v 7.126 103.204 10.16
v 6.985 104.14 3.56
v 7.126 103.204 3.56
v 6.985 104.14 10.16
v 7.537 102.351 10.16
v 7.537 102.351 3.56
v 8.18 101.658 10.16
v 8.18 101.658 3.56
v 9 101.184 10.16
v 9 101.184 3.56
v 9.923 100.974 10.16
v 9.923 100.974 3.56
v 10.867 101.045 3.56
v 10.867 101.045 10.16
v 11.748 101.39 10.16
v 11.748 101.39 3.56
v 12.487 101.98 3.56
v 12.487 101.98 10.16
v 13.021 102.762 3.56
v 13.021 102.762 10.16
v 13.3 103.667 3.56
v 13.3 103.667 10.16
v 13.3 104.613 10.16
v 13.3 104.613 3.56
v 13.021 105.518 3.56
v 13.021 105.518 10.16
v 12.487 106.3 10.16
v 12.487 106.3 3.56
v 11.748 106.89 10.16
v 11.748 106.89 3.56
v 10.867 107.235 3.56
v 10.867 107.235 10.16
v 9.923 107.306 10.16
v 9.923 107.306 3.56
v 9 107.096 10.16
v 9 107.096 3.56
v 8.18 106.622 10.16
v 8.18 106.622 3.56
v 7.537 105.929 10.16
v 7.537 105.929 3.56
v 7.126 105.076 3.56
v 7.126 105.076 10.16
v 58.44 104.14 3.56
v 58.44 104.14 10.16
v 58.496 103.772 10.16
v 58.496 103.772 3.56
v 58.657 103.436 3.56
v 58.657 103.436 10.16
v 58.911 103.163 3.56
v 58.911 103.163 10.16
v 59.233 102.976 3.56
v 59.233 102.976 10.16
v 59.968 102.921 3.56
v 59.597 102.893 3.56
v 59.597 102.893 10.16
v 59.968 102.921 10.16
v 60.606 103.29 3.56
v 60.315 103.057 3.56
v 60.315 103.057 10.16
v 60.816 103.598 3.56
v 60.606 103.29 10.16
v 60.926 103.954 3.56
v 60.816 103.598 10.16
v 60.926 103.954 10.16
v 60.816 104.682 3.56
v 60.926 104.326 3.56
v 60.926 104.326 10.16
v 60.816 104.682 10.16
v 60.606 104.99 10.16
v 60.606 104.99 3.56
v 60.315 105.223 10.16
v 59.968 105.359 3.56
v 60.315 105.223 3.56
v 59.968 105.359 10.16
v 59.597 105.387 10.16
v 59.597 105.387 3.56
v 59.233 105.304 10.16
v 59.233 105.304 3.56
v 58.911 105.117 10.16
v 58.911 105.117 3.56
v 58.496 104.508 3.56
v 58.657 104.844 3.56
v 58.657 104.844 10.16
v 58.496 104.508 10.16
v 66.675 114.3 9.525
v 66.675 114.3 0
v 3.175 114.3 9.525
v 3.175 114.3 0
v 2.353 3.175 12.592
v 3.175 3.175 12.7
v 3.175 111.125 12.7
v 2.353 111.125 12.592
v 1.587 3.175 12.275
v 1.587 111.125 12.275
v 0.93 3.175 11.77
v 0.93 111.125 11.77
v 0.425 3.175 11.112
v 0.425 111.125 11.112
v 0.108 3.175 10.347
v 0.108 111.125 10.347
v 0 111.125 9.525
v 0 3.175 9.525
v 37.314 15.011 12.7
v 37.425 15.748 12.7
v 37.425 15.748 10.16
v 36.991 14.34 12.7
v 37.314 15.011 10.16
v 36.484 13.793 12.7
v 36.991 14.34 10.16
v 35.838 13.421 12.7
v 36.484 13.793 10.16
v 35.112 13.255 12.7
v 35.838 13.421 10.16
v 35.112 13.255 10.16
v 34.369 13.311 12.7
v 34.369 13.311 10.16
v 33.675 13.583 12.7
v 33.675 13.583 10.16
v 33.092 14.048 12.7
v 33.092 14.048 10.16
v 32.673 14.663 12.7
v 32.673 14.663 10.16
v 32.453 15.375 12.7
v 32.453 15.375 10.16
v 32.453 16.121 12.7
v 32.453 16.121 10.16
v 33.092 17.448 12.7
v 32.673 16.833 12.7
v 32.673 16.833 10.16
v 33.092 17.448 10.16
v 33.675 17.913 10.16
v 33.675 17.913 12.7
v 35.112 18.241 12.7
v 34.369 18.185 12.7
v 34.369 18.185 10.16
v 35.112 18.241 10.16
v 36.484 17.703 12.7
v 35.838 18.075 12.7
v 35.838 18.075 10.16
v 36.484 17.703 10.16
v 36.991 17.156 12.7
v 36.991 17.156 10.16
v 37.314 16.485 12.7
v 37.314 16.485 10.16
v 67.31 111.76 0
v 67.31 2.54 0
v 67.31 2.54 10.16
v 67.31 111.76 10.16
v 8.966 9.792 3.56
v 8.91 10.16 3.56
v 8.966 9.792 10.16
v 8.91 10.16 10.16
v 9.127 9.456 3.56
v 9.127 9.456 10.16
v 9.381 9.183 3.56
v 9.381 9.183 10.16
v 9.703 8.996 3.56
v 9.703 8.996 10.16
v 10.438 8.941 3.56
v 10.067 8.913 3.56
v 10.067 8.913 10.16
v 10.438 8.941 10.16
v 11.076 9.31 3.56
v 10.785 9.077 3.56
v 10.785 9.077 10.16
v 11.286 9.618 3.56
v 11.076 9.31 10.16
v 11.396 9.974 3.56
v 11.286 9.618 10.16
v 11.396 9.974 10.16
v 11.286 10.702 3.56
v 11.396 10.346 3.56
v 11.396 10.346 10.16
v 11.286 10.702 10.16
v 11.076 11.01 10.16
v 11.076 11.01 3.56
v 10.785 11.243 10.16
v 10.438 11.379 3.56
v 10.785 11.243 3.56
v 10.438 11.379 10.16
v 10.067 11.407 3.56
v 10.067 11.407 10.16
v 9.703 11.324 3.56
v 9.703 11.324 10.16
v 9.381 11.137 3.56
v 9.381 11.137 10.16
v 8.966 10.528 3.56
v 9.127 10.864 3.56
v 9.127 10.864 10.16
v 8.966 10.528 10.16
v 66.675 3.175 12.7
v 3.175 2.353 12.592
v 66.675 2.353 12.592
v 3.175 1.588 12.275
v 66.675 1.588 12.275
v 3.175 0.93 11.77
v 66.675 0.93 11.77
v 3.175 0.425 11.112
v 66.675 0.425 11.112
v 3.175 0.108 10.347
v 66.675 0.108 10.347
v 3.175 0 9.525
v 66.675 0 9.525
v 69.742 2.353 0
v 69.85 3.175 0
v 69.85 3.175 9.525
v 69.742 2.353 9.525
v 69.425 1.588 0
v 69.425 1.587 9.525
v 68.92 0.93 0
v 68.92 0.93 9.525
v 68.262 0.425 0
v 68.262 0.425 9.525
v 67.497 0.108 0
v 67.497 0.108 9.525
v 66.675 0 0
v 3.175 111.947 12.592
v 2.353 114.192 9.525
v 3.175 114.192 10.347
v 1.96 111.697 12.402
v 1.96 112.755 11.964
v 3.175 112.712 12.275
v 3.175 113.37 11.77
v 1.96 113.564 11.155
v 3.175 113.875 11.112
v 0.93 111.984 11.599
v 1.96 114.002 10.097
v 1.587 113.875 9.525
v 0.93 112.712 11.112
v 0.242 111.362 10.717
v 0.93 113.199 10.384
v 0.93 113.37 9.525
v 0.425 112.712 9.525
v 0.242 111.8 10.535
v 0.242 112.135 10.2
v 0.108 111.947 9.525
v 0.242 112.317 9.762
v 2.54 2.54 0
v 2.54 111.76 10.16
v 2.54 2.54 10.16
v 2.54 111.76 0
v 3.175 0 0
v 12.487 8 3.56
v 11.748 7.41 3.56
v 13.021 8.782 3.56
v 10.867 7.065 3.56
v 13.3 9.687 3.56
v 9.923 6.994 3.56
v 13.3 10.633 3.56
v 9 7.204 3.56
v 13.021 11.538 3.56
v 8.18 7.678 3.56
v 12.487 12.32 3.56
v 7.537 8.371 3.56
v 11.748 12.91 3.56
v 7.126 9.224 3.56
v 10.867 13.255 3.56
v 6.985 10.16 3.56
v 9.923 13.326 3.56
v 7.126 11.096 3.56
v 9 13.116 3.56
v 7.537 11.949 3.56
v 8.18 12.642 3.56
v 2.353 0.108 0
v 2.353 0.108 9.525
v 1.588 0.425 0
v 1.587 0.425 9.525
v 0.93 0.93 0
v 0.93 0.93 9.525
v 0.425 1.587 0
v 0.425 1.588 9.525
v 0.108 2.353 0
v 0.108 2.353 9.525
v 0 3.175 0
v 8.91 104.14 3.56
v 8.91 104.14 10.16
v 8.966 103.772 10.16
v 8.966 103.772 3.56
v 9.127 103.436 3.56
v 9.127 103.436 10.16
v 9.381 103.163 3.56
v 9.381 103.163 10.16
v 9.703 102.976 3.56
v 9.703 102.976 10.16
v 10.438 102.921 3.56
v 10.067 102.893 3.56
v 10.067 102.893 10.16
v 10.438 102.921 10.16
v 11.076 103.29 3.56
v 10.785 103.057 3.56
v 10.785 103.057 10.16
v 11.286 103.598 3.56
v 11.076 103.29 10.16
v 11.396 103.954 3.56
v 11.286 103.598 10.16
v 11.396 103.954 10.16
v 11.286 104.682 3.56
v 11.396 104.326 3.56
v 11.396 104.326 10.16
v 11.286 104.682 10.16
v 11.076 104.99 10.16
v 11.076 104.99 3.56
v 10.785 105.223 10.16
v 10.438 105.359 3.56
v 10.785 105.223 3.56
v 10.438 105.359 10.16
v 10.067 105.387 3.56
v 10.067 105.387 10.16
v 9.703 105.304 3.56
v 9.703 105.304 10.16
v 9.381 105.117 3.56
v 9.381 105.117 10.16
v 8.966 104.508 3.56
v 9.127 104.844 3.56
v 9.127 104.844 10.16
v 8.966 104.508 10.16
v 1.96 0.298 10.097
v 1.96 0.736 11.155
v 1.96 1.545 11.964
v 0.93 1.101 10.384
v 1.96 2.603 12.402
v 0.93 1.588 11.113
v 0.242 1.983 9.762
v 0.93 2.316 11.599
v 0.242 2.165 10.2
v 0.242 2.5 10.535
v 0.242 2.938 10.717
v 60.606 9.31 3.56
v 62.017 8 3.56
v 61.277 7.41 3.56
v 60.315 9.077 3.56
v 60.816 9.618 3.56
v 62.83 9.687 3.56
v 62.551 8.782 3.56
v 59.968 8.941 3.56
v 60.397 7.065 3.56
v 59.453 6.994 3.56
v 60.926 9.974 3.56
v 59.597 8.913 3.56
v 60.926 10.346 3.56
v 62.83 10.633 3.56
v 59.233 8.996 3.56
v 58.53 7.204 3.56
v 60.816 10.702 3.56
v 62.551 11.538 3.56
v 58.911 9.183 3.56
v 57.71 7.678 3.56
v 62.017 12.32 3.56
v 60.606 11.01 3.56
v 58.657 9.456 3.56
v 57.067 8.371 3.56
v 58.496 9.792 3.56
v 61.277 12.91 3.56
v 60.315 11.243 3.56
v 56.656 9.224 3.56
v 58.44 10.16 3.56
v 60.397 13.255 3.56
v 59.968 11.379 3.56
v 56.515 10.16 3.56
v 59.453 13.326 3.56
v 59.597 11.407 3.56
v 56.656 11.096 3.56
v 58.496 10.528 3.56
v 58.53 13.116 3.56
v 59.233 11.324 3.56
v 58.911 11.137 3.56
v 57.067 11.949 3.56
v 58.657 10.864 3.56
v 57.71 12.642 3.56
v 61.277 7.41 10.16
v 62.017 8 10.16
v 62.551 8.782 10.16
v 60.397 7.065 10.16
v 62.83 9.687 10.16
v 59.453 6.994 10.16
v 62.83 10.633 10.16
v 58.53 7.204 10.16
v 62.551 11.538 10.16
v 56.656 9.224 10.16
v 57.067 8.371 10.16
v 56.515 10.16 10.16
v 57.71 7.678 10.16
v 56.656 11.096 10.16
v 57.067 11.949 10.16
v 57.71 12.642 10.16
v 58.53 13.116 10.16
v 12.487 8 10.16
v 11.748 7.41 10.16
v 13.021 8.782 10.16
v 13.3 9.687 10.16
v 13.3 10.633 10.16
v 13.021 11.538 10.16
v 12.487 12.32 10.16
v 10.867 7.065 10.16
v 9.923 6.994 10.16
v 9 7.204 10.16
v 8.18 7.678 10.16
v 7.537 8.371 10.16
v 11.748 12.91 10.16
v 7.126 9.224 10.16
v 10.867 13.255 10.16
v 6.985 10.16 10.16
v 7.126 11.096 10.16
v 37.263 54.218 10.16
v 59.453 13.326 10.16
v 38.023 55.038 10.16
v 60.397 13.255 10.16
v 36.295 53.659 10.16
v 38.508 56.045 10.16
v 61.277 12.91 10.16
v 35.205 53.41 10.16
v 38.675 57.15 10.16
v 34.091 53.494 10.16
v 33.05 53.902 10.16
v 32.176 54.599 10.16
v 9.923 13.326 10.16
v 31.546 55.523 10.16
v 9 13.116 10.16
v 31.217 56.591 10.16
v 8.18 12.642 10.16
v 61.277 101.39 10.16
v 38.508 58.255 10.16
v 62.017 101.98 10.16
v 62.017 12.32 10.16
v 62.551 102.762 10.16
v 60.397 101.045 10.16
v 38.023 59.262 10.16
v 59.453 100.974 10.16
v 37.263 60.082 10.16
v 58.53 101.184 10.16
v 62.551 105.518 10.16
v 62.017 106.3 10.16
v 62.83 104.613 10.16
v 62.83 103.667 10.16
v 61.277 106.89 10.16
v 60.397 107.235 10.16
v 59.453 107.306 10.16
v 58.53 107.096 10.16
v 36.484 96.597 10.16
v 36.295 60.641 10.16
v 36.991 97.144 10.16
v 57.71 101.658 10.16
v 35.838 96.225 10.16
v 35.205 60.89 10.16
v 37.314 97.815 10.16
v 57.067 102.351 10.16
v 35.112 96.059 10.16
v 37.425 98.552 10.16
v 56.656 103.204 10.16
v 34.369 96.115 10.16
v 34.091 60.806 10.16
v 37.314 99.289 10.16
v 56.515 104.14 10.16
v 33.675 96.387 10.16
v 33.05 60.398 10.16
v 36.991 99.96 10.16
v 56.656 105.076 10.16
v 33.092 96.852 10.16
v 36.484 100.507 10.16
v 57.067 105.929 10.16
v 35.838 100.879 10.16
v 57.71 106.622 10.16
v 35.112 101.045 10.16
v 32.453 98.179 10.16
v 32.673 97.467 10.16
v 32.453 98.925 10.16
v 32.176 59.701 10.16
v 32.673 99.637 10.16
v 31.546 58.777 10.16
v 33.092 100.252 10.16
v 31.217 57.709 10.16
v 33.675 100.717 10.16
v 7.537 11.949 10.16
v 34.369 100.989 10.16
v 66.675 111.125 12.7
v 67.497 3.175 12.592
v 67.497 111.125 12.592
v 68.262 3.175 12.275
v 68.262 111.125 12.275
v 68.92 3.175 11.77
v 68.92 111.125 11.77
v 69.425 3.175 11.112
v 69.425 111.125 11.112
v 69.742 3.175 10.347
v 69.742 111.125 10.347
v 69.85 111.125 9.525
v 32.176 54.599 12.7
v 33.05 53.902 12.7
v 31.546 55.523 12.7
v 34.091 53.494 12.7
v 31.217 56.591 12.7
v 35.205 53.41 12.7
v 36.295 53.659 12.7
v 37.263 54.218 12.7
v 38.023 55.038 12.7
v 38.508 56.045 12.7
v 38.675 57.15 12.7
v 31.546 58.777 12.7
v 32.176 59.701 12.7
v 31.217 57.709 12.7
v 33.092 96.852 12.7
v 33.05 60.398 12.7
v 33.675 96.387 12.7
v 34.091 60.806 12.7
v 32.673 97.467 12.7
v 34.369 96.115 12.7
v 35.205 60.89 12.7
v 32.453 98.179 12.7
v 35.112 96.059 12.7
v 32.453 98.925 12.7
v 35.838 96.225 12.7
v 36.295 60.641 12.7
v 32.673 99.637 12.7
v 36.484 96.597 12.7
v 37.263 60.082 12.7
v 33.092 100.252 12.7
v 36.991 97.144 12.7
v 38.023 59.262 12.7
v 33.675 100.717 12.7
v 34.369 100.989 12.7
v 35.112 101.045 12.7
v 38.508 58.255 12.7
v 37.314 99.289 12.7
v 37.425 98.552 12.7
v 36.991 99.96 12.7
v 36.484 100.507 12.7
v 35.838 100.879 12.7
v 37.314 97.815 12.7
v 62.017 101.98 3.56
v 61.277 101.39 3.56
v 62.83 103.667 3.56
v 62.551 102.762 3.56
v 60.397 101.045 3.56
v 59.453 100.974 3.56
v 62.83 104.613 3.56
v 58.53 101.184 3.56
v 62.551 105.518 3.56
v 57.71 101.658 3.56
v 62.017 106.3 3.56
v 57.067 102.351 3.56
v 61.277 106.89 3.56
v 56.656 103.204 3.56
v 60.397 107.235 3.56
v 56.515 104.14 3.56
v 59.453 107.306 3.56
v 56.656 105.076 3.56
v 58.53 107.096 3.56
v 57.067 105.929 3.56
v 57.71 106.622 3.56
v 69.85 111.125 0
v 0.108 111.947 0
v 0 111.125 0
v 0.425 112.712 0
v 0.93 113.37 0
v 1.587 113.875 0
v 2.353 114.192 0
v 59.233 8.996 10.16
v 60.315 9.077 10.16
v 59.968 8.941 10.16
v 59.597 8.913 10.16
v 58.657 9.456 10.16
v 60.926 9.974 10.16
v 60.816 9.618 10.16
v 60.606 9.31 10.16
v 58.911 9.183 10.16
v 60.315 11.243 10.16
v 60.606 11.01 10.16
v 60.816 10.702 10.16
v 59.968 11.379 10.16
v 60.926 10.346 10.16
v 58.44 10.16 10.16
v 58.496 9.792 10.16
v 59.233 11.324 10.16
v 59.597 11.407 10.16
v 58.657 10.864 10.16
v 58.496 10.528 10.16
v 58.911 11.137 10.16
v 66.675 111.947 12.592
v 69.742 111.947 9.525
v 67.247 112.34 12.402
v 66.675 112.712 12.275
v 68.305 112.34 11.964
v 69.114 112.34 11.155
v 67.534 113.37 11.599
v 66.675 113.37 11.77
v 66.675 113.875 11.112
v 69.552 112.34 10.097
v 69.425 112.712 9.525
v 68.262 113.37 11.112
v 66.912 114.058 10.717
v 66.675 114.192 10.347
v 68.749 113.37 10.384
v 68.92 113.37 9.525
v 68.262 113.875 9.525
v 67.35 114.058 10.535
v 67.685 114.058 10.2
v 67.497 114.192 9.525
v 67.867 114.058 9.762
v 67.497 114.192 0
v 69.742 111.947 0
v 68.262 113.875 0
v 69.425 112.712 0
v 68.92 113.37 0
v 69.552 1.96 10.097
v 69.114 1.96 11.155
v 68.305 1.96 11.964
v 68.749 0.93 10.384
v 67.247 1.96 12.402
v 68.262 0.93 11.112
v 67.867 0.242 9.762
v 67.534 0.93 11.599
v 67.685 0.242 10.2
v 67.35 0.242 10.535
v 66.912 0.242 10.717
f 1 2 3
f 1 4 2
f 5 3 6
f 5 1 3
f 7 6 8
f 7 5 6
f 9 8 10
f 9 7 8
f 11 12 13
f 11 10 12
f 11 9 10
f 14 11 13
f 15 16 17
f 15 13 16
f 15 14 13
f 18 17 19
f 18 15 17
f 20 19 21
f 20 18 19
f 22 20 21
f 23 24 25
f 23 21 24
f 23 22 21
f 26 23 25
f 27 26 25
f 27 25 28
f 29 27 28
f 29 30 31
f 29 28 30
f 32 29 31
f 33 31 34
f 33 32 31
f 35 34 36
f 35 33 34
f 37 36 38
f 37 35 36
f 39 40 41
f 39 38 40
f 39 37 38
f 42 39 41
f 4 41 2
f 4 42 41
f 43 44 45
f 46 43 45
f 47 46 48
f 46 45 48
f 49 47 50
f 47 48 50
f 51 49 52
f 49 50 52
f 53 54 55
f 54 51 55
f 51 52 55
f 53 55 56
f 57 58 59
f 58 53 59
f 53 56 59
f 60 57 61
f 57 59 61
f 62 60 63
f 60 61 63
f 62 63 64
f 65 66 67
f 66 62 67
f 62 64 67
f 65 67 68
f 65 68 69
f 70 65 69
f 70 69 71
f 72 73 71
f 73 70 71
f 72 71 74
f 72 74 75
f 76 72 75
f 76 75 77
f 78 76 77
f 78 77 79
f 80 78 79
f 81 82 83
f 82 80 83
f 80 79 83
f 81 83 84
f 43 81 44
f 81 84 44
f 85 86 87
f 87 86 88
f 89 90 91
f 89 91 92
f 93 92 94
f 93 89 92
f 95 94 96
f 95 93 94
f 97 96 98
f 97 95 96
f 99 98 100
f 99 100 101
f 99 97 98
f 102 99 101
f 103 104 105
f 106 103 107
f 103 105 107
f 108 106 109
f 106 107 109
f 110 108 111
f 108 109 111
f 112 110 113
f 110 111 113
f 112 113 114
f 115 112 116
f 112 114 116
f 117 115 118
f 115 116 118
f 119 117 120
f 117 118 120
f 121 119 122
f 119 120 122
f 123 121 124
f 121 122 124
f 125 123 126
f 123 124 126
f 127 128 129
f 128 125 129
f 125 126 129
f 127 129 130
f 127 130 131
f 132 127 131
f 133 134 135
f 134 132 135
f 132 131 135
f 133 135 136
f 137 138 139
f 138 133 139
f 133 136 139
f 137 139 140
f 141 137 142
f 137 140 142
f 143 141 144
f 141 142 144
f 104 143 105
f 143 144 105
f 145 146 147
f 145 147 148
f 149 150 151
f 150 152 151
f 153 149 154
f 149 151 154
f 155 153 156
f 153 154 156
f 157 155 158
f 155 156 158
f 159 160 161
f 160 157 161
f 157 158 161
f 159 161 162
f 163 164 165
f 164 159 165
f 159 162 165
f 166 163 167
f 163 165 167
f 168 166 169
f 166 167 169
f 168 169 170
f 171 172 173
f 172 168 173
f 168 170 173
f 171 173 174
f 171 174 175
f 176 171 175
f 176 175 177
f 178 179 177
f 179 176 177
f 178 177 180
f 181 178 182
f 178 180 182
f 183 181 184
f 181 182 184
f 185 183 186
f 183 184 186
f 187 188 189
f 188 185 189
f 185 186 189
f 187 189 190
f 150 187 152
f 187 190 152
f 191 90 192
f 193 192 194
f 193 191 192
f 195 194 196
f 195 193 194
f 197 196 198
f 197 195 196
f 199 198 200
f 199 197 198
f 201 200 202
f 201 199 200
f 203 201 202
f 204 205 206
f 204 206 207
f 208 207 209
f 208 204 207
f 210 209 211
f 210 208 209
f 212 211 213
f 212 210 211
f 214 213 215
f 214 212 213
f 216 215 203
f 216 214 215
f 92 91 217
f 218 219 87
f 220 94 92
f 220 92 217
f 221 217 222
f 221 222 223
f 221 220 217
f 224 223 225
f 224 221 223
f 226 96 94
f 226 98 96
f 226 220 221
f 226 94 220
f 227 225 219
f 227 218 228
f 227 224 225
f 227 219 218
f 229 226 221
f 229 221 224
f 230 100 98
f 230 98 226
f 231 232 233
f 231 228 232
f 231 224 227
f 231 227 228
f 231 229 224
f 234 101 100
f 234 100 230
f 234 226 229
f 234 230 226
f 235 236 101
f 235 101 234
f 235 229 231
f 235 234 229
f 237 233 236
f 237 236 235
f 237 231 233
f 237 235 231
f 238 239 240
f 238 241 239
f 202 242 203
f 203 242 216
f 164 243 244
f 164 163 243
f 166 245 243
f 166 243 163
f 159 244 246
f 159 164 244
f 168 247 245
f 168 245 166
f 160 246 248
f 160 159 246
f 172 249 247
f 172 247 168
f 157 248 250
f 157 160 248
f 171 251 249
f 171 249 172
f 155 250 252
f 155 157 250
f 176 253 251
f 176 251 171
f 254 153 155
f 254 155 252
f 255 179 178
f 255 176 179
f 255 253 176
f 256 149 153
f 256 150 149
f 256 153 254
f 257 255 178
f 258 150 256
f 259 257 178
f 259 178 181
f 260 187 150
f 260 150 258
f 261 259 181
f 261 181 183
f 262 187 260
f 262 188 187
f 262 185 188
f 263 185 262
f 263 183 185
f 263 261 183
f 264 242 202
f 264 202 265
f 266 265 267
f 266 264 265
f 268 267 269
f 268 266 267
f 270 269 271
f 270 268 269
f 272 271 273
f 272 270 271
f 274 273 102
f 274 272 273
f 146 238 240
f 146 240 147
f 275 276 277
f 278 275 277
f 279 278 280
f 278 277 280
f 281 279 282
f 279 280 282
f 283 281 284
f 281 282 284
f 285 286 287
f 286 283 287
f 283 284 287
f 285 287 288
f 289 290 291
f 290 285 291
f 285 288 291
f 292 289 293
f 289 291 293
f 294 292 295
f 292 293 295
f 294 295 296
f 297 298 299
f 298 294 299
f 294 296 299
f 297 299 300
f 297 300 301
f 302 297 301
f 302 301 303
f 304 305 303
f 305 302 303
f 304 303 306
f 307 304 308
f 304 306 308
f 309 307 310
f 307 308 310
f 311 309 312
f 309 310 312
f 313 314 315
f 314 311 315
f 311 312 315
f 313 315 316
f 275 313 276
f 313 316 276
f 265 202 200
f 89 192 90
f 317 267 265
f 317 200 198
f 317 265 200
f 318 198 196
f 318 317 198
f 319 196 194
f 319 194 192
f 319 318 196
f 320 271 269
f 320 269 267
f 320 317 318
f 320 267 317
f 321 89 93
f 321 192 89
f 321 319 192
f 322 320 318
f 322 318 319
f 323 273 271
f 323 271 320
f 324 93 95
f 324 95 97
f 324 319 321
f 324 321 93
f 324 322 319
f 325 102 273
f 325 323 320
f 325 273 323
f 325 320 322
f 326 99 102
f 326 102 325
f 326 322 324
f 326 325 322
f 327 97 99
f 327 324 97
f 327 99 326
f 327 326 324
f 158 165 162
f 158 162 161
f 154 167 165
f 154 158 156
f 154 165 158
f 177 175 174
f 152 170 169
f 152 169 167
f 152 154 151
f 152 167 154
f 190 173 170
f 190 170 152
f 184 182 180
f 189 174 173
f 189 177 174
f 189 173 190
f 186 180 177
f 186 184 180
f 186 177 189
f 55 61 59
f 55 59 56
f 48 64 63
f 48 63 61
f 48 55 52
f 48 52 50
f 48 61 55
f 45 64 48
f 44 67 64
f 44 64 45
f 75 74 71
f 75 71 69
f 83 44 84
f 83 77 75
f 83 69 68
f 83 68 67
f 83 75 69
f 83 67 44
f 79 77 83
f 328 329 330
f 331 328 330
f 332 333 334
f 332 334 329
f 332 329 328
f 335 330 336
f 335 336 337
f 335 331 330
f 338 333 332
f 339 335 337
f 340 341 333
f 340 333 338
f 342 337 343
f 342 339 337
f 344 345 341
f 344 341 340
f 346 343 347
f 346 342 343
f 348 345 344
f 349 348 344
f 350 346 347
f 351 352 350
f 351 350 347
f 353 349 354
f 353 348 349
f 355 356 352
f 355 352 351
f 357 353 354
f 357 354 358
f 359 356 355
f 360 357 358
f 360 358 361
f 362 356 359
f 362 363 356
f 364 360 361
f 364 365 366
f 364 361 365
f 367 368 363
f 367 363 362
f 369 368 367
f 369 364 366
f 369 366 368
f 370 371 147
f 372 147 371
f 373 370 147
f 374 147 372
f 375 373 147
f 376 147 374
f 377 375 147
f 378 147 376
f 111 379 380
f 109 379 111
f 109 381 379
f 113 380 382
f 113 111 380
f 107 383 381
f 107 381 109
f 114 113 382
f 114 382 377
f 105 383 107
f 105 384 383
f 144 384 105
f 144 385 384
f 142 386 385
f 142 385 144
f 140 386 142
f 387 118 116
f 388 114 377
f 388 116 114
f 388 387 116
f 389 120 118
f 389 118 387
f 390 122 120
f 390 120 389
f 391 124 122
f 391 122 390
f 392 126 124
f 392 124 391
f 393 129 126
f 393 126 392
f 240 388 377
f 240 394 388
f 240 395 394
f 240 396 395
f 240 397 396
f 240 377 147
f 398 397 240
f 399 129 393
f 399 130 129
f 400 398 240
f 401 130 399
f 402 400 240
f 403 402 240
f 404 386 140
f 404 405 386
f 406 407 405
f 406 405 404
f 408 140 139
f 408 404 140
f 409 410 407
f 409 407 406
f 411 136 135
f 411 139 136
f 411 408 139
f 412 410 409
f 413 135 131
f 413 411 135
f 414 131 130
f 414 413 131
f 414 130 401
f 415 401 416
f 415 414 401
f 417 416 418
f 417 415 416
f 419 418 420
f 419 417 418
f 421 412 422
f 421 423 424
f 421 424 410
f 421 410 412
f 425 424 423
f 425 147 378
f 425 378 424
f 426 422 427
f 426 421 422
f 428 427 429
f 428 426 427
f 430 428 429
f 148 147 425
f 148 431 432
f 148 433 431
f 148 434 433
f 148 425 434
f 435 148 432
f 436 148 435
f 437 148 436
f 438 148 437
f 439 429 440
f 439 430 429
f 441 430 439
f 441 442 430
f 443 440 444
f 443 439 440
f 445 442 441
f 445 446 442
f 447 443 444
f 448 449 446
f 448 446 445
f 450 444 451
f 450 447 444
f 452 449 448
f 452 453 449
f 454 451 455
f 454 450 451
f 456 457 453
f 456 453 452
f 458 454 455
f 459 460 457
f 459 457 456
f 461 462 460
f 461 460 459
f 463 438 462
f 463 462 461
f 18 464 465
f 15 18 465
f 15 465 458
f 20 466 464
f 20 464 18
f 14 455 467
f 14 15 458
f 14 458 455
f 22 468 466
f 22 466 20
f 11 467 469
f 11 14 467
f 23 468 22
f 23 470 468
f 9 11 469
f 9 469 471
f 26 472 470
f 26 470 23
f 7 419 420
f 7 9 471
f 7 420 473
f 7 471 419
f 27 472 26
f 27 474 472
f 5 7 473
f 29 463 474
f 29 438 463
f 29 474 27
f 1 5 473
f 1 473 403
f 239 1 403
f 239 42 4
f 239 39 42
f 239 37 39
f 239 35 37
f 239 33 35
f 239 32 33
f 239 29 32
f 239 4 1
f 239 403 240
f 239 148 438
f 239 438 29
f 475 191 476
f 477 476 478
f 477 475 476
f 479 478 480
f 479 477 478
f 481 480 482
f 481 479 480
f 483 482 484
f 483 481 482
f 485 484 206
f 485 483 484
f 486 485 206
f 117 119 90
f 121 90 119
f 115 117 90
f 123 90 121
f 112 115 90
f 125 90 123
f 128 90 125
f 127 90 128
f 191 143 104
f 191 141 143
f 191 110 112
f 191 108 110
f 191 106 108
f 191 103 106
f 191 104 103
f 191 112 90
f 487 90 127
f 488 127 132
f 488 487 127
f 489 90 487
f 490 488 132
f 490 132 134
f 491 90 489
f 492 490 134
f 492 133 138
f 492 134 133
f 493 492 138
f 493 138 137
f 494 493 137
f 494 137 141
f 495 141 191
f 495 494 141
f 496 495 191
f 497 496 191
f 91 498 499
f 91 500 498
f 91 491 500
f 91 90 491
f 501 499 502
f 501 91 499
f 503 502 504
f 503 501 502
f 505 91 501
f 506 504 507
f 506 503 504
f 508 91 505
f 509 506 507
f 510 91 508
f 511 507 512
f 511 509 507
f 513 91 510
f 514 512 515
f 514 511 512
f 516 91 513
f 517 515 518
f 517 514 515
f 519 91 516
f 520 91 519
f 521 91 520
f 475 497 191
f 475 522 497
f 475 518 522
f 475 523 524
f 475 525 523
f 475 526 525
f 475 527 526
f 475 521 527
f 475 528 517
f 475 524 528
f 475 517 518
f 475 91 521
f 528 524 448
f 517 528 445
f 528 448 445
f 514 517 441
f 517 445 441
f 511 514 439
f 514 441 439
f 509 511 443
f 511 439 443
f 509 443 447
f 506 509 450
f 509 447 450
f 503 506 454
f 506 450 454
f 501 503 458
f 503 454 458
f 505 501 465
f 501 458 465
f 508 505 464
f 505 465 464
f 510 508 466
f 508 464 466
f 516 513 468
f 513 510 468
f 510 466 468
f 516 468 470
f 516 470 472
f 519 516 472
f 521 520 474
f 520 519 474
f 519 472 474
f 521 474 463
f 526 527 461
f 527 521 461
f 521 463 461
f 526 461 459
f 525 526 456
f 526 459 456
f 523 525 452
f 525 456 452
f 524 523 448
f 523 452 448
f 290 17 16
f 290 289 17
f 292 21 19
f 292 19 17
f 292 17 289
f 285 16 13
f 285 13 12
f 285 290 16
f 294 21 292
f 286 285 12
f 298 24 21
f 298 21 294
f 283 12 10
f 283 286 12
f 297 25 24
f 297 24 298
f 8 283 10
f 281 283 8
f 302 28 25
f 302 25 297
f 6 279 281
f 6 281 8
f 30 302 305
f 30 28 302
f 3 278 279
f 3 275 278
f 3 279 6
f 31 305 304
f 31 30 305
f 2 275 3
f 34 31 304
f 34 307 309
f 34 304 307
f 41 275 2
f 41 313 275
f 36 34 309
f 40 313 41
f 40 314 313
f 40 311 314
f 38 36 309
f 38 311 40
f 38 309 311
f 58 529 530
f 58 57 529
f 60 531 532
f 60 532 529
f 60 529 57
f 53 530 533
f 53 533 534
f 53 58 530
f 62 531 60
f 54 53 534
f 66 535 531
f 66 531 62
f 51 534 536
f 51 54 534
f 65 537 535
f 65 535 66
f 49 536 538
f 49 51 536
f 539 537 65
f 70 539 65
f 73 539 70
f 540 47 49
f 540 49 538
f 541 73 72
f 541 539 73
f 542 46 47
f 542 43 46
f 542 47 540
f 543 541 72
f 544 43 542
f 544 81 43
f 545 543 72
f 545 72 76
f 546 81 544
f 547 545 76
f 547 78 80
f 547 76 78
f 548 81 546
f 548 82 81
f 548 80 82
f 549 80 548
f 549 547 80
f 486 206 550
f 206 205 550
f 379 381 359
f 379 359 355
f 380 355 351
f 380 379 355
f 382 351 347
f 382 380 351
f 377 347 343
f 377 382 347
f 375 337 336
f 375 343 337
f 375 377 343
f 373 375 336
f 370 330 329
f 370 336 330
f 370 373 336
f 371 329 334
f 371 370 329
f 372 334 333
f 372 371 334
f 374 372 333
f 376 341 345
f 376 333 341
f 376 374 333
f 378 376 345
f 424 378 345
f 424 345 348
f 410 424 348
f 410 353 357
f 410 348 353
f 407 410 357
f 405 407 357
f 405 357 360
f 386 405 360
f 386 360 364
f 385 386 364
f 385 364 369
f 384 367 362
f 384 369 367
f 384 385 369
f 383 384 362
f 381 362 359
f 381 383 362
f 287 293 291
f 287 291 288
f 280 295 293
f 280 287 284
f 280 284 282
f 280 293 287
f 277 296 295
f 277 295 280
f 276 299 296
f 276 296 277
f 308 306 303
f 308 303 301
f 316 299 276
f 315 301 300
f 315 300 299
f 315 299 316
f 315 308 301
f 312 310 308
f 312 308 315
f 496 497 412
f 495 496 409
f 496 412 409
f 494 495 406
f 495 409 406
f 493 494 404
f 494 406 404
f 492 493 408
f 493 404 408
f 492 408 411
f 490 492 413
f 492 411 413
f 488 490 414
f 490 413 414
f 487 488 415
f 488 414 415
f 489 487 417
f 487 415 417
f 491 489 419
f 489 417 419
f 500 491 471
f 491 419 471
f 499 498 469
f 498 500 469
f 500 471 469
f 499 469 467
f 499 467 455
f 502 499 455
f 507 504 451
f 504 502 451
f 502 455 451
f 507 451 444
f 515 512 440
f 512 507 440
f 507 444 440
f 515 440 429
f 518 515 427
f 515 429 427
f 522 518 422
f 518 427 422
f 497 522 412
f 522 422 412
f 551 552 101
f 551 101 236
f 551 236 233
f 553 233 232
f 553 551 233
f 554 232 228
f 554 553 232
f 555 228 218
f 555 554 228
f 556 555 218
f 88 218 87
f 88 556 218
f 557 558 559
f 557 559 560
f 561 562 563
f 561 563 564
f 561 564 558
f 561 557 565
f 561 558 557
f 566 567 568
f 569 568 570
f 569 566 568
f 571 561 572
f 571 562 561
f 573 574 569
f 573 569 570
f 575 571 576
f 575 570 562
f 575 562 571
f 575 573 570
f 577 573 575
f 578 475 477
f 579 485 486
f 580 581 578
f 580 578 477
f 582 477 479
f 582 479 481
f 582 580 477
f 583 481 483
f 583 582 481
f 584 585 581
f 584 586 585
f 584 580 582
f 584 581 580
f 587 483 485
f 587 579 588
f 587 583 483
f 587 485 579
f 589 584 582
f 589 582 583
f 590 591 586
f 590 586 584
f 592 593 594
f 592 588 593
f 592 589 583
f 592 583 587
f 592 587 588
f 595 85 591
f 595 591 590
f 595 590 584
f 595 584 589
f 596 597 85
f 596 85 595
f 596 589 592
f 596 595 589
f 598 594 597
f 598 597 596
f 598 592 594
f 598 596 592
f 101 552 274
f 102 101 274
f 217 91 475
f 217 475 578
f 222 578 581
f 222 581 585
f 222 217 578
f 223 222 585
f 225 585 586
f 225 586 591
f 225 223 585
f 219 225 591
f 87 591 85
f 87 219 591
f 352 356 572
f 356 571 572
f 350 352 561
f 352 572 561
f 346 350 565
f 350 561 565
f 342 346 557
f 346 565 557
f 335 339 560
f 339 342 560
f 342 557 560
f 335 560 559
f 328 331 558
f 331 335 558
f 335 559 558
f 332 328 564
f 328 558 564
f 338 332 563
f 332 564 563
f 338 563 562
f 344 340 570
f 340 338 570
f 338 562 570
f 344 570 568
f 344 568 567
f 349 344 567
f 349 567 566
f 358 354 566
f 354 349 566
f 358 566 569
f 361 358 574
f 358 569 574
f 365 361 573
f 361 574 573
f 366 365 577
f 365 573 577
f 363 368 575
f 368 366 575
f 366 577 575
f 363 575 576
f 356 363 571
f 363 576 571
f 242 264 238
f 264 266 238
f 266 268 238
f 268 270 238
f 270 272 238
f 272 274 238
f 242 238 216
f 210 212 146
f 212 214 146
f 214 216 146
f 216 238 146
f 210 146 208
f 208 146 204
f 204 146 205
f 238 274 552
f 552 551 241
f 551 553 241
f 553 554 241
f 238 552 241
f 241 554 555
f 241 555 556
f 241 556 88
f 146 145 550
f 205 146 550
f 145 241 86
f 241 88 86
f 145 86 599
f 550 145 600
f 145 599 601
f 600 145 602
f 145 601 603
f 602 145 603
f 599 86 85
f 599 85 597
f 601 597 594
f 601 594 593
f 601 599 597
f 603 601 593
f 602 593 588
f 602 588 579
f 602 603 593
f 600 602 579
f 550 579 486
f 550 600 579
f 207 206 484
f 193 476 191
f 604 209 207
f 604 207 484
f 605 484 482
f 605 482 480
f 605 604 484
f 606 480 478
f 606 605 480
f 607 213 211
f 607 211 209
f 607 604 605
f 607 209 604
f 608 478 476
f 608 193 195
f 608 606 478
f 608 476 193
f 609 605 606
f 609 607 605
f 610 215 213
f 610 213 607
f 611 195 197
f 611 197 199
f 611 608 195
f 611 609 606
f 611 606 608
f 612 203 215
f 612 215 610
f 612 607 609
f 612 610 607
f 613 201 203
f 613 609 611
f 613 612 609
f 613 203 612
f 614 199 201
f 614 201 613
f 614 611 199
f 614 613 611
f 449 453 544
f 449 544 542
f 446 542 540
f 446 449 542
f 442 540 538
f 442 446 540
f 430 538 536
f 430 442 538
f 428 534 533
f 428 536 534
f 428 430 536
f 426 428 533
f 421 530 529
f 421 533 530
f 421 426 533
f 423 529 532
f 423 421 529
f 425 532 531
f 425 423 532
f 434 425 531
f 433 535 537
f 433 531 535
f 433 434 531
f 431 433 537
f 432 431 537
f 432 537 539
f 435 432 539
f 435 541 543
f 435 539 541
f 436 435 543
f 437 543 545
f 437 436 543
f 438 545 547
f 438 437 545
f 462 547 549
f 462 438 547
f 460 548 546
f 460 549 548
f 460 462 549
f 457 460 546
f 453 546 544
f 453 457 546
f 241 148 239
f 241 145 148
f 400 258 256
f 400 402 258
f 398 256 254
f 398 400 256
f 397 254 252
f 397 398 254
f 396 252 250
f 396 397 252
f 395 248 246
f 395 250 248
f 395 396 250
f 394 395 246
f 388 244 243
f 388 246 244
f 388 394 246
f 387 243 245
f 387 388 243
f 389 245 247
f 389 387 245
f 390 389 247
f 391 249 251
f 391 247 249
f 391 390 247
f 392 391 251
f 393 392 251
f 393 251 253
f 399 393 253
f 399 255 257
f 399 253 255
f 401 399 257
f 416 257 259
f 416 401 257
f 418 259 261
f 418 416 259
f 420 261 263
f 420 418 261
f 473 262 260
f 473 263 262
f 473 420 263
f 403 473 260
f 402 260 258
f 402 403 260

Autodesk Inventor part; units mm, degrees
ref_plane "YZ Plane" through (0, 0, 0) normal (1, 0, 0) x (0, 1, 0)
ref_plane "XZ Plane" through (0, 0, 0) normal (0, 1, 0) x (-1, 0, 0)
ref_plane "XY Plane" through (0, 0, 0) normal (0, 0, 1) x (1, 0, 0)
sketch "Sketch1" plane through (0, 0, 0) normal (0, 0, 1) x (1, 0, 0)
  line L0 (0, 0) -> (69.85, 0)
  line L1 (69.85, 0) -> (69.85, 114.3)
  line L2 (69.85, 114.3) -> (0, 114.3)
  line L3 (0, 114.3) -> (0, 0)
  circle A0 centre (34.925, 98.552) radius 2.5
  circle A1 centre (34.925, 15.748) radius 2.5
  circle A2 centre (34.925, 57.15) radius 3.75
  point P0 (34.925, 114.3)
  point P1 (0, 57.15)
  dimension "d0" = 69.85
  dimension "d1" = 114.3
  dimension "d13" = 82.804
  dimension "d14" = 5
  dimension "d15" = 5
  dimension "d16" = 7.5
  dimension "d17" = 15.748
extrude "Extrusion2" add sketch "Sketch1" along normal blind 12.7
sketch "Sketch3" plane through (0, 0, 0) normal (0, 0, -1) x (-1, 0, 0)
  line L0 (-67.31, 111.76) -> (-2.54, 111.76)
  line L1 (-2.54, 111.76) -> (-2.54, 2.54)
  line L2 (-2.54, 2.54) -> (-67.31, 2.54)
  line L3 (-67.31, 2.54) -> (-67.31, 111.76)
  circle A0 centre (-34.925, 57.15) radius 3.75 projected
  circle A1 centre (-34.925, 15.748) radius 2.5 projected
  circle A2 centre (-34.925, 98.552) radius 2.5 projected
  line L4 (0, 0) -> (-69.85, 0) projected
  line L5 (0, 114.3) -> (0, 0) projected
  line L6 (-69.85, 114.3) -> (0, 114.3) projected
  line L7 (-69.85, 0) -> (-69.85, 114.3) projected
  dimension "d20" = 114.3
  dimension "d21" = 69.85
  dimension "d22" = 2.54
  dimension "d24" = 2.54
  dimension "d25" = 2.54
  dimension "d26" = 2.54
extrude "Extrusion3" cut sketch "Sketch3" against normal blind 10.16 contours L0 L1 L2 L3
sketch "Sketch4" plane through (0, 0, 10.16) normal (0, 0, -1) x (-1, 0, 0)
  circle A0 centre (-34.925, 57.15) radius 3.75 projected
  circle A1 centre (-34.925, 98.552) radius 2.5 projected
  circle A2 centre (-34.925, 15.748) radius 2.5 projected
  line L0 (-67.31, 111.76) -> (-2.54, 111.76) projected
  line L1 (-67.31, 2.54) -> (-67.31, 111.76) projected
  line L2 (-2.54, 2.54) -> (-67.31, 2.54) projected
  line L3 (-2.54, 111.76) -> (-2.54, 2.54) projected
  circle A3 centre (-59.69, 104.14) radius 3.175
  circle A4 centre (-59.69, 104.14) radius 1.25
  circle A5 centre (-10.16, 104.14) radius 3.175
  circle A6 centre (-10.16, 104.14) radius 1.25
  circle A7 centre (-59.69, 10.16) radius 3.175
  circle A8 centre (-59.69, 10.16) radius 1.25
  circle A9 centre (-10.16, 10.16) radius 3.175
  circle A10 centre (-10.16, 10.16) radius 1.25
  point P0 (0, 0)
  dimension "d29" = 6.35
  dimension "d30" = 2.5
  dimension "d31" = 6.35
  dimension "d32" = 2.5
  dimension "d33" = 7.62
  dimension "d34" = 7.62
  dimension "d35" = 7.62
  dimension "d36" = 7.62
  dimension "d37" = 6.35
  dimension "d38" = 2.5
  dimension "d39" = 7.62
  dimension "d40" = 7.62
  dimension "d41" = 6.35
  dimension "d42" = 2.5
  dimension "d43" = 7.62
  dimension "d44" = 7.62
extrude "Extrusion4" add sketch "Sketch4" along normal blind 6.6 contours A3 | A5 | A7 | A9
fillet "Fillet1" radius 3.175 4 edges at (0, 57.15, 12.7) (69.85, 57.15, 12.7) (34.925, 114.3, 12.7) (34.925, 0, 12.7)
fillet "Fillet2" radius 3.175 8 edges at (0.9299, 113.3701, 11.7701) (0, 114.3, 4.7625) (68.9201, 113.3701, 11.7701) (69.85, 114.3, 4.7625) (0.9299, 0.9299, 11.7701) (0, 0, 4.7625) (68.9201, 0.9299, 11.7701) (69.85, 0, 4.7625)
equation "\"d17\" = -0.5 * d13 + 0.5 * d1"
equation "\"d24\" = d22"
equation "\"d25\" = d22"
equation "\"d26\" = d22"
equation "\"d31\" = d29"
equation "\"d32\" = d30"
equation "\"d34\" = d33"
equation "\"d35\" = d33"
equation "\"d36\" = d33"
equation "\"d37\" = d29"
equation "\"d38\" = d30"
equation "\"d39\" = d33"
equation "\"d40\" = d33"
equation "\"d41\" = d29"
equation "\"d42\" = d30"
equation "\"d43\" = d33"
equation "\"d44\" = d33"
properties part number "LightSwitchCover" material "Nylon 6/6"
